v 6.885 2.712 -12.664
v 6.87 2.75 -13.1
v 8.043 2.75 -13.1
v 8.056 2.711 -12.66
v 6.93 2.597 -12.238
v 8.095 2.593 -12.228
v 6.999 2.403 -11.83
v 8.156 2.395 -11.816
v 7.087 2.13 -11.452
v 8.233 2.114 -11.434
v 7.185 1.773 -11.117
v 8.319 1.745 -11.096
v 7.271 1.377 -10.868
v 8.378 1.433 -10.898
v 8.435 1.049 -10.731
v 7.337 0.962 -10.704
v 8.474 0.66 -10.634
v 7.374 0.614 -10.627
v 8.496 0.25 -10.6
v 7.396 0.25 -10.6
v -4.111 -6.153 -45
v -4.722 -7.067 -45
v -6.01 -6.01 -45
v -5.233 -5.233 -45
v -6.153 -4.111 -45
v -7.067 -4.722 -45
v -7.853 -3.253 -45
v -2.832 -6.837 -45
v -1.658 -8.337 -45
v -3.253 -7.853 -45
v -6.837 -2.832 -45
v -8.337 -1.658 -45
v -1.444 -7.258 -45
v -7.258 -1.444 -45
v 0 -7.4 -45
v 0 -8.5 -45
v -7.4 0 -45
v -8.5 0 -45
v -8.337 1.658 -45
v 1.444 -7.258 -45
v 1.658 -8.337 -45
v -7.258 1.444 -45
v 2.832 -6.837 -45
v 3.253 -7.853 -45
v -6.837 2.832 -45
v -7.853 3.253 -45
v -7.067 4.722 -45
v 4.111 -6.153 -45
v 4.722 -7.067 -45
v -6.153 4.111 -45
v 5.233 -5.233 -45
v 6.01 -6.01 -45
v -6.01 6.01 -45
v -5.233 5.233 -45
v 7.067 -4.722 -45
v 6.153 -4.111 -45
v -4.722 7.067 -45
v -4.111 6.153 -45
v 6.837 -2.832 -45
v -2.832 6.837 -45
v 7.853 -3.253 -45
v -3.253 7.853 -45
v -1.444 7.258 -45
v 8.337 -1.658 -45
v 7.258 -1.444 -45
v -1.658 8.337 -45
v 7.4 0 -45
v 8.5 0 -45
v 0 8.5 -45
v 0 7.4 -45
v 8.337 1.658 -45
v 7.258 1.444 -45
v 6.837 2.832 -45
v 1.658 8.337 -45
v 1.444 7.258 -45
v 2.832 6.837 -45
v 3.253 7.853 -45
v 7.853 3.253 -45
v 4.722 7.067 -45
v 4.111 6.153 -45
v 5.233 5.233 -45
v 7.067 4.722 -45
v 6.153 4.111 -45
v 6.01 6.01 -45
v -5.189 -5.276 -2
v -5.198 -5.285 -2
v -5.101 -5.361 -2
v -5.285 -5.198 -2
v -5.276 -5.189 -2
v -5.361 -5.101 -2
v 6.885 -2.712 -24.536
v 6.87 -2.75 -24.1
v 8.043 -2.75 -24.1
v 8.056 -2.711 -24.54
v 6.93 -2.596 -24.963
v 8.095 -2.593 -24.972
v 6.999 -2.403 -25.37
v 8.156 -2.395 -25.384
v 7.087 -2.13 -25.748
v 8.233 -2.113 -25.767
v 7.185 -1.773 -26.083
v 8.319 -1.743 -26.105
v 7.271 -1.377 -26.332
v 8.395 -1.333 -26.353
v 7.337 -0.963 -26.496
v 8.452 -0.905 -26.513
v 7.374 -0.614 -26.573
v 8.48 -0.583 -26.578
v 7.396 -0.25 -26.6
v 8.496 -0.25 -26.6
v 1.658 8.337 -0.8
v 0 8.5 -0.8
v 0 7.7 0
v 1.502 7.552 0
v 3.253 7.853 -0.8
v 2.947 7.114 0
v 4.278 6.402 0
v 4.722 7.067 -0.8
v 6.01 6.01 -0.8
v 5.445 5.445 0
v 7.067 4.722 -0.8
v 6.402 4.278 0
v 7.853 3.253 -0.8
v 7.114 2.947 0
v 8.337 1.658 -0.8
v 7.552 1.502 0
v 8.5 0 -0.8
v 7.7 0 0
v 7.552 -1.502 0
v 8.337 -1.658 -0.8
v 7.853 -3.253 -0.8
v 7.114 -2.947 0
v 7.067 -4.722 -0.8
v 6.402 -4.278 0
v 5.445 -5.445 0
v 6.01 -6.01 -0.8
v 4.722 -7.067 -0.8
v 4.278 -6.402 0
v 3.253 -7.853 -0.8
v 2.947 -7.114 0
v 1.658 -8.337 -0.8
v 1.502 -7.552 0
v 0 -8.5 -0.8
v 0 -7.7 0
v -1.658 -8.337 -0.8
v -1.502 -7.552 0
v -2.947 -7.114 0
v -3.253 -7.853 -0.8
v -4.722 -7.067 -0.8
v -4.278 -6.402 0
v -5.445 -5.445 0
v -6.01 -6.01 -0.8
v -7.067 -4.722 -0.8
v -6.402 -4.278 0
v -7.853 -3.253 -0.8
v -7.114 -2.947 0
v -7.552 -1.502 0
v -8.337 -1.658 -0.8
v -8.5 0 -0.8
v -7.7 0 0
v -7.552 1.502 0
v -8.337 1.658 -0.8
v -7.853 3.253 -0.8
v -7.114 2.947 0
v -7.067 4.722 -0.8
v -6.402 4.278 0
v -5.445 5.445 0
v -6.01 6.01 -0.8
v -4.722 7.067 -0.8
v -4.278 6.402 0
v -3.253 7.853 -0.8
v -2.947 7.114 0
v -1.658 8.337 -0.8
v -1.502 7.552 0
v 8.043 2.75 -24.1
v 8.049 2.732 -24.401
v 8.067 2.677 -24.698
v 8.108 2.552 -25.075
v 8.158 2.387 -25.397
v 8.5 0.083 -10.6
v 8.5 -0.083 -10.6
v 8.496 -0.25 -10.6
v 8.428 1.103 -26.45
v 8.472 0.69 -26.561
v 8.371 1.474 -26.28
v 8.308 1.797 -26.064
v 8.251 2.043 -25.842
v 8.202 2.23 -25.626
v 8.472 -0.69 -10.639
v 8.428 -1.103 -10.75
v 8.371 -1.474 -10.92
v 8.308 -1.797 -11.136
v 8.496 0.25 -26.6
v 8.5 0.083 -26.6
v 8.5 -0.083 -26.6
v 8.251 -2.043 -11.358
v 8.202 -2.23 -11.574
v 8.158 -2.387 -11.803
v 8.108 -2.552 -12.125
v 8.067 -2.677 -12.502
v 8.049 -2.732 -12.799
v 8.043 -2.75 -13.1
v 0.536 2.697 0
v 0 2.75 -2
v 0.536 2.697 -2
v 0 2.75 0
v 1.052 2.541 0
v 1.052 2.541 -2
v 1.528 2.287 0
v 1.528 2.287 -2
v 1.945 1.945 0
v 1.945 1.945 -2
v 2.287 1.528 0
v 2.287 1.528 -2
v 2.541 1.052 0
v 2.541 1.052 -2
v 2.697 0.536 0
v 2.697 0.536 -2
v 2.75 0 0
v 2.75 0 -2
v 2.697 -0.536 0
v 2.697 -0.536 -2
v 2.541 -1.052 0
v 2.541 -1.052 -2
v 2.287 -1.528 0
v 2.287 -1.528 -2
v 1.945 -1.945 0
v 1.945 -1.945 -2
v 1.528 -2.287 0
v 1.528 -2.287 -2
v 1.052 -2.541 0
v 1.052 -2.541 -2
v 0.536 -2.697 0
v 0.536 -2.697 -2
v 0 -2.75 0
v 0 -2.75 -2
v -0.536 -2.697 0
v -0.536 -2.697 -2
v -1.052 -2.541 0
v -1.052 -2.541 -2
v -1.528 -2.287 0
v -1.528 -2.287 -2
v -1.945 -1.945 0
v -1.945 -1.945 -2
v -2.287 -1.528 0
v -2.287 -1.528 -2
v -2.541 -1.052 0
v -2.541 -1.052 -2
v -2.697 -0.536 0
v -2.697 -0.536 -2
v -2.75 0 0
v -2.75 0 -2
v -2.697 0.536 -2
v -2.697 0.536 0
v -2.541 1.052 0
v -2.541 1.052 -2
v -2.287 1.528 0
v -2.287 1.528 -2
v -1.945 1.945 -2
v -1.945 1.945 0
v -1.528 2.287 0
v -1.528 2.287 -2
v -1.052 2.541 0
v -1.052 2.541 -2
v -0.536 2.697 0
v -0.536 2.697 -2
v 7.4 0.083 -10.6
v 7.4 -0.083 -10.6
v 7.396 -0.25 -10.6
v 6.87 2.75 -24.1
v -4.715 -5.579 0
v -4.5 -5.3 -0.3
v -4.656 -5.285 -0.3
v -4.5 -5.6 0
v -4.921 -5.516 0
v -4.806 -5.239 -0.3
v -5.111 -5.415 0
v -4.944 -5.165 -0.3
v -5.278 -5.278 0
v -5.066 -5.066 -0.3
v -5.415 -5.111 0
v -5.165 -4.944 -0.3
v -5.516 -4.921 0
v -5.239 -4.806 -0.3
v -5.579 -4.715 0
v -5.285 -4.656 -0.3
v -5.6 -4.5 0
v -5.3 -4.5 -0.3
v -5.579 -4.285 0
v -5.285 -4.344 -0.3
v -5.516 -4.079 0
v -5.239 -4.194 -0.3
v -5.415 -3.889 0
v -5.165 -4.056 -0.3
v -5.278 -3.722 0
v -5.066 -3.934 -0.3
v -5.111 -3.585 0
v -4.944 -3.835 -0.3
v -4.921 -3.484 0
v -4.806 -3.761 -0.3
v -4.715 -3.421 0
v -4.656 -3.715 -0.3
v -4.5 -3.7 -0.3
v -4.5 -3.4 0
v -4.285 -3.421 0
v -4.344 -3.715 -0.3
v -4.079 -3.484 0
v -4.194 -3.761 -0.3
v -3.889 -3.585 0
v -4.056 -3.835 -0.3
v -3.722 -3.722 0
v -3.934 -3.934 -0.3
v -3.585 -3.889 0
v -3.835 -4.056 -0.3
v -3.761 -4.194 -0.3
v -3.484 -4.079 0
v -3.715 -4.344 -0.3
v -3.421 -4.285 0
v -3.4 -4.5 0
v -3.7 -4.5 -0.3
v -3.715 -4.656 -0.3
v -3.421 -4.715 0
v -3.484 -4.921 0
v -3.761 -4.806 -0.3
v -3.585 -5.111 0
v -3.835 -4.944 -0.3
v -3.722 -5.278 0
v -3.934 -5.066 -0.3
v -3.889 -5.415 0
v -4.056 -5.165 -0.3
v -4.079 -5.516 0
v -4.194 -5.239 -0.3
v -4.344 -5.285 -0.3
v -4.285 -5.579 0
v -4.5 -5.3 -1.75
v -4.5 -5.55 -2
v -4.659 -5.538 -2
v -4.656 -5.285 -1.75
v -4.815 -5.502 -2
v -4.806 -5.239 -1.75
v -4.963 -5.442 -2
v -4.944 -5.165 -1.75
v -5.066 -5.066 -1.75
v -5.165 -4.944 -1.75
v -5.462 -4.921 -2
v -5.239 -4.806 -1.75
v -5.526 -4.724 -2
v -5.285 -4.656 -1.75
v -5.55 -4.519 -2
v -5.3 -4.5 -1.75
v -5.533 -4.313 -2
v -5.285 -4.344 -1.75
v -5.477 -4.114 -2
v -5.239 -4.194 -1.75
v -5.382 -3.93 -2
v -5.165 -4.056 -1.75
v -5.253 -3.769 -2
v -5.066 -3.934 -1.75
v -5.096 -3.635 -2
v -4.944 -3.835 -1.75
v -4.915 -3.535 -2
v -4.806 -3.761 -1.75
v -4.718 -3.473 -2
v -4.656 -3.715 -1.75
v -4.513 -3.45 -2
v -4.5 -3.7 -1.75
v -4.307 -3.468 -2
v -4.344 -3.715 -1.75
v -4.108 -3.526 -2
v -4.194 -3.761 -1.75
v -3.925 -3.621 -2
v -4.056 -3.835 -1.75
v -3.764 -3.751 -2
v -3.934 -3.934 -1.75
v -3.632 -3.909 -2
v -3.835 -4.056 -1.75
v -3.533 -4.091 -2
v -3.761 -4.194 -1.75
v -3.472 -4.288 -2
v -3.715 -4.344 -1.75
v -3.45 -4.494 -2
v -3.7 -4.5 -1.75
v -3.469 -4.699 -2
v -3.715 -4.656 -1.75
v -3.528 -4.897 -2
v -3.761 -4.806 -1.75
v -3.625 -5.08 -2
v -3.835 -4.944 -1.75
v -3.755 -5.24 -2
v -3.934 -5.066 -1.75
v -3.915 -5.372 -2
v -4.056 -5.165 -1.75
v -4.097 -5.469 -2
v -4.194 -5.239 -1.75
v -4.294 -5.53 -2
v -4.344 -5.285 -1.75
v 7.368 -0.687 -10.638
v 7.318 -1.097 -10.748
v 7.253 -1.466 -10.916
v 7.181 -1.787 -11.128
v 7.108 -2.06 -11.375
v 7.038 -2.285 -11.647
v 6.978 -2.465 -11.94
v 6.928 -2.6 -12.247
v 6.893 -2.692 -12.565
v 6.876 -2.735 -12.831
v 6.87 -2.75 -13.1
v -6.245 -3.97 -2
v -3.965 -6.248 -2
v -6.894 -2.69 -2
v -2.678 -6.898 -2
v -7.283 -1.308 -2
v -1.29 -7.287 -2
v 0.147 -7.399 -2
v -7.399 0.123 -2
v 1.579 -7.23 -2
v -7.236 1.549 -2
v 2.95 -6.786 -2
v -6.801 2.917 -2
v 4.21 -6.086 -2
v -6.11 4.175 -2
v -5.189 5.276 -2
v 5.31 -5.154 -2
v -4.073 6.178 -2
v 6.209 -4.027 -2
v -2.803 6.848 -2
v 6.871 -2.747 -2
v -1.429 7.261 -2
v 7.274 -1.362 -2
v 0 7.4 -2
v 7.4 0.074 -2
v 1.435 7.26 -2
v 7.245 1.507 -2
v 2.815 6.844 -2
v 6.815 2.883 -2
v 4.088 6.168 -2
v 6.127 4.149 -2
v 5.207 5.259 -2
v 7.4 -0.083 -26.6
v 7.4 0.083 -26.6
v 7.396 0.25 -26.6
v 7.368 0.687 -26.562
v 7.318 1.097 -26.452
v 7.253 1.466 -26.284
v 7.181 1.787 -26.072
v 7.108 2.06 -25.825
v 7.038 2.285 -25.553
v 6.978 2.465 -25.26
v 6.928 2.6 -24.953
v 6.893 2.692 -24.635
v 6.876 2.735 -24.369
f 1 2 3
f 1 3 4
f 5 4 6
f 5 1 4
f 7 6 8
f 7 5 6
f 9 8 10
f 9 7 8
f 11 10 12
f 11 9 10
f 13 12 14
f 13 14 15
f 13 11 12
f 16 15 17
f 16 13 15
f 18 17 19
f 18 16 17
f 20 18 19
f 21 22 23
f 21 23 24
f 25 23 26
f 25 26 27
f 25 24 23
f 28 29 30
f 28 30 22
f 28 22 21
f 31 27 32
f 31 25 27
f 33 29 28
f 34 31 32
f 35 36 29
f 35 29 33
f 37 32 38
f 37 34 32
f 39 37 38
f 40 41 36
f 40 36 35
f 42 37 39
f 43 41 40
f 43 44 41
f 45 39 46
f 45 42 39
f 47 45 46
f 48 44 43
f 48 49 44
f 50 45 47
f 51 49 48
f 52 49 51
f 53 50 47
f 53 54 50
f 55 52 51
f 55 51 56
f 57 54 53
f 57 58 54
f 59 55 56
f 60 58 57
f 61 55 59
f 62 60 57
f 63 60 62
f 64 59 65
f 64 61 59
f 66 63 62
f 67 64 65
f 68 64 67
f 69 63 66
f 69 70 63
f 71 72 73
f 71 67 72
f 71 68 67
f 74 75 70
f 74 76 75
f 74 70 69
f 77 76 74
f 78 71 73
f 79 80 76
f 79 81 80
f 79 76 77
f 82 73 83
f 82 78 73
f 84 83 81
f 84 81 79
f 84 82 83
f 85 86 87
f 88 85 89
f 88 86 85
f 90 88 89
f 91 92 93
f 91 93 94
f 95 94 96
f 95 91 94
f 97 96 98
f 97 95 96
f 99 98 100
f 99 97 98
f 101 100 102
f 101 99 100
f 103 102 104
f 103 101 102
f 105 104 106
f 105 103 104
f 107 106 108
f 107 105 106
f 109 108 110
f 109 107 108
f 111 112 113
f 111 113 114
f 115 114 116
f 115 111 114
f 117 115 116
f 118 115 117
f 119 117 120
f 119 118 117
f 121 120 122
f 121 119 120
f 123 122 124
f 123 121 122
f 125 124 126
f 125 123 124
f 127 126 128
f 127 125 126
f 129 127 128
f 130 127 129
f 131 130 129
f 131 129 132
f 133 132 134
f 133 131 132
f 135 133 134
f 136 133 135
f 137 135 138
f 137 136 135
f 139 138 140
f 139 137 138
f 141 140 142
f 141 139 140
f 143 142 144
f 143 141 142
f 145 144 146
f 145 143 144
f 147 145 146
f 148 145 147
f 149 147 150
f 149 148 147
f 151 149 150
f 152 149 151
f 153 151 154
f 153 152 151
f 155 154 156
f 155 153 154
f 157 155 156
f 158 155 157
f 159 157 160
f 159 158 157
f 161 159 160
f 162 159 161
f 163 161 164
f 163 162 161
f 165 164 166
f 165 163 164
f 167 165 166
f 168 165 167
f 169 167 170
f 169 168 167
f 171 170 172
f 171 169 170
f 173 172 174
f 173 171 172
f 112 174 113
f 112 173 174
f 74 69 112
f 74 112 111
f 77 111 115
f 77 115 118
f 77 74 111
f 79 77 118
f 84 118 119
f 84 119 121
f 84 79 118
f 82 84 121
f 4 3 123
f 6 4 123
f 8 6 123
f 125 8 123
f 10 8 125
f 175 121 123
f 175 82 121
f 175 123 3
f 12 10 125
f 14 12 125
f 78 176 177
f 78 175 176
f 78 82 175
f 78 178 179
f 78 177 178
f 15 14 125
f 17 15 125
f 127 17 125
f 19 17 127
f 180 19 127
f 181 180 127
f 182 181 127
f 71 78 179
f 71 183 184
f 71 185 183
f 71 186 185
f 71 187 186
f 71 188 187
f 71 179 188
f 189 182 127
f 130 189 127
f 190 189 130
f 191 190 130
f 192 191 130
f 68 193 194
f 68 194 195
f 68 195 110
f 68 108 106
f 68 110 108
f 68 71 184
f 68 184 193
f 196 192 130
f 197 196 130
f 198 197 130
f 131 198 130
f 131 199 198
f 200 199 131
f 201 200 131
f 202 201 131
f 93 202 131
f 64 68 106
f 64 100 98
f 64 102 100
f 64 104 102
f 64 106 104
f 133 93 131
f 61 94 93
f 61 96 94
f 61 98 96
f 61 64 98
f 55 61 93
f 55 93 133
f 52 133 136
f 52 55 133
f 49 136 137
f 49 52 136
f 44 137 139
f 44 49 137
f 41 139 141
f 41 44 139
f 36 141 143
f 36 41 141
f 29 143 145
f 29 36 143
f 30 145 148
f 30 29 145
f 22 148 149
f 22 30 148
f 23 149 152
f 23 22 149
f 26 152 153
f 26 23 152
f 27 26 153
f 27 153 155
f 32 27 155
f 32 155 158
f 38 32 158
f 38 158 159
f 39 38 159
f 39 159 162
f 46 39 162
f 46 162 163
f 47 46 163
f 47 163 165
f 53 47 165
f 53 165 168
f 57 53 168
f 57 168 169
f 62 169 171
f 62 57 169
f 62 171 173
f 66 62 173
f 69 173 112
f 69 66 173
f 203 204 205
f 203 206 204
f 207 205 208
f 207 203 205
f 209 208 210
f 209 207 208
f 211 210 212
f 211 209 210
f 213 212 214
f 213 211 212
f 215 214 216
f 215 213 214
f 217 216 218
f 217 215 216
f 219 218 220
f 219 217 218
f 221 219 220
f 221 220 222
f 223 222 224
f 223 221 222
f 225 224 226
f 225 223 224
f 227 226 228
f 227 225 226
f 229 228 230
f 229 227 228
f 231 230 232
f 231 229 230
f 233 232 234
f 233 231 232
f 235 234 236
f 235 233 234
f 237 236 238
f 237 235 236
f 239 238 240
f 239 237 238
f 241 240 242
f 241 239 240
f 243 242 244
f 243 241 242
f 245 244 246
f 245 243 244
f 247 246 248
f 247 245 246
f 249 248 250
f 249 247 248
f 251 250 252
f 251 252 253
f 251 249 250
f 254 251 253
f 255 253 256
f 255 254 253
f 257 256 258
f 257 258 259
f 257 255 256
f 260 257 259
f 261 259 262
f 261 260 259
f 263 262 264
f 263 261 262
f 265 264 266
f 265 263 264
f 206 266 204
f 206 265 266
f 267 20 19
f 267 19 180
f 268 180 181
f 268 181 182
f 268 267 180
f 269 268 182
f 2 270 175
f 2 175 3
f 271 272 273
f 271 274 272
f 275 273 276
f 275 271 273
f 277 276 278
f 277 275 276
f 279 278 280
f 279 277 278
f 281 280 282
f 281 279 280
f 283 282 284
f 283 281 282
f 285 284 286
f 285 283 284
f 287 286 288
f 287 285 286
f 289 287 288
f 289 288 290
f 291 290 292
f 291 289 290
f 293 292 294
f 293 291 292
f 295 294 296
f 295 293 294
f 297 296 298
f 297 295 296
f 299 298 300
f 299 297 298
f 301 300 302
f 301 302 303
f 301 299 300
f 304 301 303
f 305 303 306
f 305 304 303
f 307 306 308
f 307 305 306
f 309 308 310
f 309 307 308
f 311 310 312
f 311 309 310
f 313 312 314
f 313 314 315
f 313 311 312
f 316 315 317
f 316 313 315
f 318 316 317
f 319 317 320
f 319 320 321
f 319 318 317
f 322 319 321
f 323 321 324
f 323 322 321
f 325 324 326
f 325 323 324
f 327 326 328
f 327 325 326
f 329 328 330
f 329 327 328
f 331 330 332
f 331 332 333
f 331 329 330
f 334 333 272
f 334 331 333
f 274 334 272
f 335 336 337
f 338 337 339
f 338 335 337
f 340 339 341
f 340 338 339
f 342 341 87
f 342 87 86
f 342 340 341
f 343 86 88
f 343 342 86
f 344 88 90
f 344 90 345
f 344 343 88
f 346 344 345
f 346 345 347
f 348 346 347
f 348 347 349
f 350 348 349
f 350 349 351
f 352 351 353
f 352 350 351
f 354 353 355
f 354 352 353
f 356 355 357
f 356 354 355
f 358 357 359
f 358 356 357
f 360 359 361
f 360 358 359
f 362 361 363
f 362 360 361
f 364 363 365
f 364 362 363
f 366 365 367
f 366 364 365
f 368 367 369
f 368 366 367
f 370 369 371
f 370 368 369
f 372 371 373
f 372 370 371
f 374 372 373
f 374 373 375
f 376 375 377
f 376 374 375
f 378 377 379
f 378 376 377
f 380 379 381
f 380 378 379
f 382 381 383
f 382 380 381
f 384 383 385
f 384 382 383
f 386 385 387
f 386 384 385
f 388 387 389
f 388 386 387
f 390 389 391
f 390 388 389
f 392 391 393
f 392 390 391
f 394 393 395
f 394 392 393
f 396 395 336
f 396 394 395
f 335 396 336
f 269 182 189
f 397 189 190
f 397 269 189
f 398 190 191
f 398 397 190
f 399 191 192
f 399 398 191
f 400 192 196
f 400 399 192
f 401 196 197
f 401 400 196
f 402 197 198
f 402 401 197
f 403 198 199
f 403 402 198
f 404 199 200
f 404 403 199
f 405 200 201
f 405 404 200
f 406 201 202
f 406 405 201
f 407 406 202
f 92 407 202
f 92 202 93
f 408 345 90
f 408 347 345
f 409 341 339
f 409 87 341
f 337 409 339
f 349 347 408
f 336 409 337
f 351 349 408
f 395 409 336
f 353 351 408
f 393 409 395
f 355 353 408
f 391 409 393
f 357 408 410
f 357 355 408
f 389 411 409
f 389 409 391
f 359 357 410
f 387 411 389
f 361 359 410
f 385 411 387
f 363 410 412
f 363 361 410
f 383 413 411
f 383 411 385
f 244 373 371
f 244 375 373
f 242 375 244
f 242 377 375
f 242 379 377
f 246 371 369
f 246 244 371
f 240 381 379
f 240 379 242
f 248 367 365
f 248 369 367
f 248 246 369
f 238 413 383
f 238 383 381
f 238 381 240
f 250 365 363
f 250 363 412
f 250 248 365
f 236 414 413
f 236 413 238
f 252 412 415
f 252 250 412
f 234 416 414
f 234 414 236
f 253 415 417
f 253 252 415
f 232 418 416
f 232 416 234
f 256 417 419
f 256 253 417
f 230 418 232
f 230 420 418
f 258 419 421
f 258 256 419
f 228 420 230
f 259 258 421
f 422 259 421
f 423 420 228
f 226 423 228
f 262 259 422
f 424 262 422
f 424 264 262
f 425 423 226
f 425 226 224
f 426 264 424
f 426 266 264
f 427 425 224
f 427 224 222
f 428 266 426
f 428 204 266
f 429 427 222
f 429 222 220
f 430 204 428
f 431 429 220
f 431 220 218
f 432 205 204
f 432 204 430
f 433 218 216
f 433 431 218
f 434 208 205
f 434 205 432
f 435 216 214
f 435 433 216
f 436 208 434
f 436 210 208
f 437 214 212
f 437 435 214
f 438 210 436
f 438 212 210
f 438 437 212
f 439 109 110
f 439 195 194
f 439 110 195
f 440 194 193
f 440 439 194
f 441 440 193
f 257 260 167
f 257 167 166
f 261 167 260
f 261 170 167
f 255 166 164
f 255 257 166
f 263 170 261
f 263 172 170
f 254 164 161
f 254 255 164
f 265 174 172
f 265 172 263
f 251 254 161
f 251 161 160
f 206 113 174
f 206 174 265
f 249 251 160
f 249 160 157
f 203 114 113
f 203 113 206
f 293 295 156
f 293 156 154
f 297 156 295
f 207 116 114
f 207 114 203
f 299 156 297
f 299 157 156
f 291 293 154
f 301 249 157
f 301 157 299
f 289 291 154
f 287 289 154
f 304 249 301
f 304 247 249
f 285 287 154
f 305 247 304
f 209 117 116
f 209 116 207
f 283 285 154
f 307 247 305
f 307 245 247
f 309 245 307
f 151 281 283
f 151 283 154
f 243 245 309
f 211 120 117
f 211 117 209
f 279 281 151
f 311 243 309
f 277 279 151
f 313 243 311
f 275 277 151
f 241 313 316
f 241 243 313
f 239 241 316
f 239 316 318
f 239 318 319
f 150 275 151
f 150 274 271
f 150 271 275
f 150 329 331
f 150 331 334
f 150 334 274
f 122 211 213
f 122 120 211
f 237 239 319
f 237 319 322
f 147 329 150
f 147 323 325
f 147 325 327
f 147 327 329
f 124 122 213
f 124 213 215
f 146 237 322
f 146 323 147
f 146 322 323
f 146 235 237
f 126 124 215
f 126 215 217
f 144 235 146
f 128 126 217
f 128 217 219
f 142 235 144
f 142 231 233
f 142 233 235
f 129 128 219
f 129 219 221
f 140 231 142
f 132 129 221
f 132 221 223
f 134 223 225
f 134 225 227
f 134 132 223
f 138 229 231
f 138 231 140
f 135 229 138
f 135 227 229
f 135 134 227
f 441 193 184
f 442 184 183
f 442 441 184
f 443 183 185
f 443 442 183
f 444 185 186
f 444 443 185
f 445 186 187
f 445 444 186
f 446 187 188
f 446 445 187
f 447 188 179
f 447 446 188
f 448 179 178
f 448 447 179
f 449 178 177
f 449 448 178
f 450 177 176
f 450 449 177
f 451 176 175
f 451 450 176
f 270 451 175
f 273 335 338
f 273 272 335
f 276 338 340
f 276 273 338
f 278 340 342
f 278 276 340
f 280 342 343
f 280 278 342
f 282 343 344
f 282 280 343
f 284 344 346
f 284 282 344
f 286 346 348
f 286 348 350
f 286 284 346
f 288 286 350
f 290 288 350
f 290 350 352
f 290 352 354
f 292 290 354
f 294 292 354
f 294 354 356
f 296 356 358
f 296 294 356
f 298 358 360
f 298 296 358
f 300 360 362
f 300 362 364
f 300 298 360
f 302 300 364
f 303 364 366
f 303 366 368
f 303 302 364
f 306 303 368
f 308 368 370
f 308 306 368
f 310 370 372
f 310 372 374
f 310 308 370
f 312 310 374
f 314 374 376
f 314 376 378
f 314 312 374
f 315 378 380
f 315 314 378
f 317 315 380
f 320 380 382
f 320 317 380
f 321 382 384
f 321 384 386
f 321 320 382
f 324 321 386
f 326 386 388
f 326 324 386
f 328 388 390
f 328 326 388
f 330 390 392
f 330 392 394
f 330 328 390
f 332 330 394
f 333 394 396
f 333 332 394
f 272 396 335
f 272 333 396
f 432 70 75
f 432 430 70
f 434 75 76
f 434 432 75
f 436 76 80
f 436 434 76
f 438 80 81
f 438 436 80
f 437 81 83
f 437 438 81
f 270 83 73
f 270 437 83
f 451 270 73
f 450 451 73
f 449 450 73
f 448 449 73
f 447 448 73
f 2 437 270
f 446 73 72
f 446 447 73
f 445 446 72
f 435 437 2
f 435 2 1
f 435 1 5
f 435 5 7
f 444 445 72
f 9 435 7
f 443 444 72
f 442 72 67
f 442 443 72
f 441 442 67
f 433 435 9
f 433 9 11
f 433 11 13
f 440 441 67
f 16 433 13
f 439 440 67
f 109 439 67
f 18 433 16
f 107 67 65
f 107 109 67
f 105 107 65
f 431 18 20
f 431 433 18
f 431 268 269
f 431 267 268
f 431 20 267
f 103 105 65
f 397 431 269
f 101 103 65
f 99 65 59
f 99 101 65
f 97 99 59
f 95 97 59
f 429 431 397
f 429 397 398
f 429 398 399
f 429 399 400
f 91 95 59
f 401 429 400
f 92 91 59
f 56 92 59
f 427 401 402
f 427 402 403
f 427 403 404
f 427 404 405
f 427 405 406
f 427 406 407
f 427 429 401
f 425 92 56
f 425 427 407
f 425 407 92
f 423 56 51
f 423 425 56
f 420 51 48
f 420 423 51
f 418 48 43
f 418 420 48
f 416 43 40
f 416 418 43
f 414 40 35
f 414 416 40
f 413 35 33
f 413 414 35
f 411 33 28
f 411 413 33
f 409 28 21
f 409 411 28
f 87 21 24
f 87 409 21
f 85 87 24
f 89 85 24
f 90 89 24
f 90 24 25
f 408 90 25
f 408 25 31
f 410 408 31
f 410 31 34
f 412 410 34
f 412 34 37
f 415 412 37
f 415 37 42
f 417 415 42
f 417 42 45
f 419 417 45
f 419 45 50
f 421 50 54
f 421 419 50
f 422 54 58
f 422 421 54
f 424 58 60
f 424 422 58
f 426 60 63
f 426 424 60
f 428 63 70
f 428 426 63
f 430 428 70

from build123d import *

# Parameters (mm, degrees)
CUT_EXTRUDE_1_DEPTH = 9.5
CHAMFER_1_SIZE      = 0.8


with BuildPart() as part:
    # Эскиз1 → Повернуть1 (revolve)
    with BuildSketch(Plane(origin=(0, 0, 0), x_dir=(0, 0, -1), z_dir=(1, 0, 0))):
        Polygon((0, 2.75), (0, 8.5), (45, 8.5), (45, 7.4), (2, 7.4), (2, 2.75), align=None)
    revolve(axis=Axis((0, 0, 0), (0, 0, -1)))

    # Эскиз2 → Вырез-Вытянуть1 (cut, through all)
    with BuildSketch(Plane(origin=(0, 0, 0), x_dir=(0, 0, -1), z_dir=(1, 0, 0))):
        with BuildLine():
            Line((13.1, -2.75), (24.1, -2.75))
            ThreePointArc((24.1, -2.75), (25.867766953, -2.017766953), (26.6, -0.25))
            Line((26.6, -0.25), (26.6, 0.25))
            ThreePointArc((26.6, 0.25), (25.867766953, 2.017766953), (24.1, 2.75))
            Line((24.1, 2.75), (13.1, 2.75))
            ThreePointArc((13.1, 2.75), (11.332233047, 2.017766953), (10.6, 0.25))
            Line((10.6, 0.25), (10.6, -0.25))
            ThreePointArc((10.6, -0.25), (11.332233047, -2.017766953), (13.1, -2.75))
        make_face()
    extrude(amount=CUT_EXTRUDE_1_DEPTH, mode=Mode.SUBTRACT)

    # Фаска1
    chamfer_1_edges = [part.edges().sort_by_distance(p)[0] for p in [
        (0, -8.5, 0),
    ]]
    chamfer(chamfer_1_edges, length=CHAMFER_1_SIZE)

    # Эскиз4 → Отверстие обработанное метчиком M2x0.41 (revolve, cut)
    with BuildSketch(Plane(origin=(-4.5, -4.5, 0), x_dir=(0, -1, 0), z_dir=(1, 0, 0))):
        Polygon((0, 0), (0, 2), (1.05, 2), (0.8, 1.75), (0.8, 0.3), (1.1, 0), align=None)
    revolve(axis=Axis((-4.5, -4.5, 6.35), (0, 0, -1)), mode=Mode.SUBTRACT)


solid = part.part
